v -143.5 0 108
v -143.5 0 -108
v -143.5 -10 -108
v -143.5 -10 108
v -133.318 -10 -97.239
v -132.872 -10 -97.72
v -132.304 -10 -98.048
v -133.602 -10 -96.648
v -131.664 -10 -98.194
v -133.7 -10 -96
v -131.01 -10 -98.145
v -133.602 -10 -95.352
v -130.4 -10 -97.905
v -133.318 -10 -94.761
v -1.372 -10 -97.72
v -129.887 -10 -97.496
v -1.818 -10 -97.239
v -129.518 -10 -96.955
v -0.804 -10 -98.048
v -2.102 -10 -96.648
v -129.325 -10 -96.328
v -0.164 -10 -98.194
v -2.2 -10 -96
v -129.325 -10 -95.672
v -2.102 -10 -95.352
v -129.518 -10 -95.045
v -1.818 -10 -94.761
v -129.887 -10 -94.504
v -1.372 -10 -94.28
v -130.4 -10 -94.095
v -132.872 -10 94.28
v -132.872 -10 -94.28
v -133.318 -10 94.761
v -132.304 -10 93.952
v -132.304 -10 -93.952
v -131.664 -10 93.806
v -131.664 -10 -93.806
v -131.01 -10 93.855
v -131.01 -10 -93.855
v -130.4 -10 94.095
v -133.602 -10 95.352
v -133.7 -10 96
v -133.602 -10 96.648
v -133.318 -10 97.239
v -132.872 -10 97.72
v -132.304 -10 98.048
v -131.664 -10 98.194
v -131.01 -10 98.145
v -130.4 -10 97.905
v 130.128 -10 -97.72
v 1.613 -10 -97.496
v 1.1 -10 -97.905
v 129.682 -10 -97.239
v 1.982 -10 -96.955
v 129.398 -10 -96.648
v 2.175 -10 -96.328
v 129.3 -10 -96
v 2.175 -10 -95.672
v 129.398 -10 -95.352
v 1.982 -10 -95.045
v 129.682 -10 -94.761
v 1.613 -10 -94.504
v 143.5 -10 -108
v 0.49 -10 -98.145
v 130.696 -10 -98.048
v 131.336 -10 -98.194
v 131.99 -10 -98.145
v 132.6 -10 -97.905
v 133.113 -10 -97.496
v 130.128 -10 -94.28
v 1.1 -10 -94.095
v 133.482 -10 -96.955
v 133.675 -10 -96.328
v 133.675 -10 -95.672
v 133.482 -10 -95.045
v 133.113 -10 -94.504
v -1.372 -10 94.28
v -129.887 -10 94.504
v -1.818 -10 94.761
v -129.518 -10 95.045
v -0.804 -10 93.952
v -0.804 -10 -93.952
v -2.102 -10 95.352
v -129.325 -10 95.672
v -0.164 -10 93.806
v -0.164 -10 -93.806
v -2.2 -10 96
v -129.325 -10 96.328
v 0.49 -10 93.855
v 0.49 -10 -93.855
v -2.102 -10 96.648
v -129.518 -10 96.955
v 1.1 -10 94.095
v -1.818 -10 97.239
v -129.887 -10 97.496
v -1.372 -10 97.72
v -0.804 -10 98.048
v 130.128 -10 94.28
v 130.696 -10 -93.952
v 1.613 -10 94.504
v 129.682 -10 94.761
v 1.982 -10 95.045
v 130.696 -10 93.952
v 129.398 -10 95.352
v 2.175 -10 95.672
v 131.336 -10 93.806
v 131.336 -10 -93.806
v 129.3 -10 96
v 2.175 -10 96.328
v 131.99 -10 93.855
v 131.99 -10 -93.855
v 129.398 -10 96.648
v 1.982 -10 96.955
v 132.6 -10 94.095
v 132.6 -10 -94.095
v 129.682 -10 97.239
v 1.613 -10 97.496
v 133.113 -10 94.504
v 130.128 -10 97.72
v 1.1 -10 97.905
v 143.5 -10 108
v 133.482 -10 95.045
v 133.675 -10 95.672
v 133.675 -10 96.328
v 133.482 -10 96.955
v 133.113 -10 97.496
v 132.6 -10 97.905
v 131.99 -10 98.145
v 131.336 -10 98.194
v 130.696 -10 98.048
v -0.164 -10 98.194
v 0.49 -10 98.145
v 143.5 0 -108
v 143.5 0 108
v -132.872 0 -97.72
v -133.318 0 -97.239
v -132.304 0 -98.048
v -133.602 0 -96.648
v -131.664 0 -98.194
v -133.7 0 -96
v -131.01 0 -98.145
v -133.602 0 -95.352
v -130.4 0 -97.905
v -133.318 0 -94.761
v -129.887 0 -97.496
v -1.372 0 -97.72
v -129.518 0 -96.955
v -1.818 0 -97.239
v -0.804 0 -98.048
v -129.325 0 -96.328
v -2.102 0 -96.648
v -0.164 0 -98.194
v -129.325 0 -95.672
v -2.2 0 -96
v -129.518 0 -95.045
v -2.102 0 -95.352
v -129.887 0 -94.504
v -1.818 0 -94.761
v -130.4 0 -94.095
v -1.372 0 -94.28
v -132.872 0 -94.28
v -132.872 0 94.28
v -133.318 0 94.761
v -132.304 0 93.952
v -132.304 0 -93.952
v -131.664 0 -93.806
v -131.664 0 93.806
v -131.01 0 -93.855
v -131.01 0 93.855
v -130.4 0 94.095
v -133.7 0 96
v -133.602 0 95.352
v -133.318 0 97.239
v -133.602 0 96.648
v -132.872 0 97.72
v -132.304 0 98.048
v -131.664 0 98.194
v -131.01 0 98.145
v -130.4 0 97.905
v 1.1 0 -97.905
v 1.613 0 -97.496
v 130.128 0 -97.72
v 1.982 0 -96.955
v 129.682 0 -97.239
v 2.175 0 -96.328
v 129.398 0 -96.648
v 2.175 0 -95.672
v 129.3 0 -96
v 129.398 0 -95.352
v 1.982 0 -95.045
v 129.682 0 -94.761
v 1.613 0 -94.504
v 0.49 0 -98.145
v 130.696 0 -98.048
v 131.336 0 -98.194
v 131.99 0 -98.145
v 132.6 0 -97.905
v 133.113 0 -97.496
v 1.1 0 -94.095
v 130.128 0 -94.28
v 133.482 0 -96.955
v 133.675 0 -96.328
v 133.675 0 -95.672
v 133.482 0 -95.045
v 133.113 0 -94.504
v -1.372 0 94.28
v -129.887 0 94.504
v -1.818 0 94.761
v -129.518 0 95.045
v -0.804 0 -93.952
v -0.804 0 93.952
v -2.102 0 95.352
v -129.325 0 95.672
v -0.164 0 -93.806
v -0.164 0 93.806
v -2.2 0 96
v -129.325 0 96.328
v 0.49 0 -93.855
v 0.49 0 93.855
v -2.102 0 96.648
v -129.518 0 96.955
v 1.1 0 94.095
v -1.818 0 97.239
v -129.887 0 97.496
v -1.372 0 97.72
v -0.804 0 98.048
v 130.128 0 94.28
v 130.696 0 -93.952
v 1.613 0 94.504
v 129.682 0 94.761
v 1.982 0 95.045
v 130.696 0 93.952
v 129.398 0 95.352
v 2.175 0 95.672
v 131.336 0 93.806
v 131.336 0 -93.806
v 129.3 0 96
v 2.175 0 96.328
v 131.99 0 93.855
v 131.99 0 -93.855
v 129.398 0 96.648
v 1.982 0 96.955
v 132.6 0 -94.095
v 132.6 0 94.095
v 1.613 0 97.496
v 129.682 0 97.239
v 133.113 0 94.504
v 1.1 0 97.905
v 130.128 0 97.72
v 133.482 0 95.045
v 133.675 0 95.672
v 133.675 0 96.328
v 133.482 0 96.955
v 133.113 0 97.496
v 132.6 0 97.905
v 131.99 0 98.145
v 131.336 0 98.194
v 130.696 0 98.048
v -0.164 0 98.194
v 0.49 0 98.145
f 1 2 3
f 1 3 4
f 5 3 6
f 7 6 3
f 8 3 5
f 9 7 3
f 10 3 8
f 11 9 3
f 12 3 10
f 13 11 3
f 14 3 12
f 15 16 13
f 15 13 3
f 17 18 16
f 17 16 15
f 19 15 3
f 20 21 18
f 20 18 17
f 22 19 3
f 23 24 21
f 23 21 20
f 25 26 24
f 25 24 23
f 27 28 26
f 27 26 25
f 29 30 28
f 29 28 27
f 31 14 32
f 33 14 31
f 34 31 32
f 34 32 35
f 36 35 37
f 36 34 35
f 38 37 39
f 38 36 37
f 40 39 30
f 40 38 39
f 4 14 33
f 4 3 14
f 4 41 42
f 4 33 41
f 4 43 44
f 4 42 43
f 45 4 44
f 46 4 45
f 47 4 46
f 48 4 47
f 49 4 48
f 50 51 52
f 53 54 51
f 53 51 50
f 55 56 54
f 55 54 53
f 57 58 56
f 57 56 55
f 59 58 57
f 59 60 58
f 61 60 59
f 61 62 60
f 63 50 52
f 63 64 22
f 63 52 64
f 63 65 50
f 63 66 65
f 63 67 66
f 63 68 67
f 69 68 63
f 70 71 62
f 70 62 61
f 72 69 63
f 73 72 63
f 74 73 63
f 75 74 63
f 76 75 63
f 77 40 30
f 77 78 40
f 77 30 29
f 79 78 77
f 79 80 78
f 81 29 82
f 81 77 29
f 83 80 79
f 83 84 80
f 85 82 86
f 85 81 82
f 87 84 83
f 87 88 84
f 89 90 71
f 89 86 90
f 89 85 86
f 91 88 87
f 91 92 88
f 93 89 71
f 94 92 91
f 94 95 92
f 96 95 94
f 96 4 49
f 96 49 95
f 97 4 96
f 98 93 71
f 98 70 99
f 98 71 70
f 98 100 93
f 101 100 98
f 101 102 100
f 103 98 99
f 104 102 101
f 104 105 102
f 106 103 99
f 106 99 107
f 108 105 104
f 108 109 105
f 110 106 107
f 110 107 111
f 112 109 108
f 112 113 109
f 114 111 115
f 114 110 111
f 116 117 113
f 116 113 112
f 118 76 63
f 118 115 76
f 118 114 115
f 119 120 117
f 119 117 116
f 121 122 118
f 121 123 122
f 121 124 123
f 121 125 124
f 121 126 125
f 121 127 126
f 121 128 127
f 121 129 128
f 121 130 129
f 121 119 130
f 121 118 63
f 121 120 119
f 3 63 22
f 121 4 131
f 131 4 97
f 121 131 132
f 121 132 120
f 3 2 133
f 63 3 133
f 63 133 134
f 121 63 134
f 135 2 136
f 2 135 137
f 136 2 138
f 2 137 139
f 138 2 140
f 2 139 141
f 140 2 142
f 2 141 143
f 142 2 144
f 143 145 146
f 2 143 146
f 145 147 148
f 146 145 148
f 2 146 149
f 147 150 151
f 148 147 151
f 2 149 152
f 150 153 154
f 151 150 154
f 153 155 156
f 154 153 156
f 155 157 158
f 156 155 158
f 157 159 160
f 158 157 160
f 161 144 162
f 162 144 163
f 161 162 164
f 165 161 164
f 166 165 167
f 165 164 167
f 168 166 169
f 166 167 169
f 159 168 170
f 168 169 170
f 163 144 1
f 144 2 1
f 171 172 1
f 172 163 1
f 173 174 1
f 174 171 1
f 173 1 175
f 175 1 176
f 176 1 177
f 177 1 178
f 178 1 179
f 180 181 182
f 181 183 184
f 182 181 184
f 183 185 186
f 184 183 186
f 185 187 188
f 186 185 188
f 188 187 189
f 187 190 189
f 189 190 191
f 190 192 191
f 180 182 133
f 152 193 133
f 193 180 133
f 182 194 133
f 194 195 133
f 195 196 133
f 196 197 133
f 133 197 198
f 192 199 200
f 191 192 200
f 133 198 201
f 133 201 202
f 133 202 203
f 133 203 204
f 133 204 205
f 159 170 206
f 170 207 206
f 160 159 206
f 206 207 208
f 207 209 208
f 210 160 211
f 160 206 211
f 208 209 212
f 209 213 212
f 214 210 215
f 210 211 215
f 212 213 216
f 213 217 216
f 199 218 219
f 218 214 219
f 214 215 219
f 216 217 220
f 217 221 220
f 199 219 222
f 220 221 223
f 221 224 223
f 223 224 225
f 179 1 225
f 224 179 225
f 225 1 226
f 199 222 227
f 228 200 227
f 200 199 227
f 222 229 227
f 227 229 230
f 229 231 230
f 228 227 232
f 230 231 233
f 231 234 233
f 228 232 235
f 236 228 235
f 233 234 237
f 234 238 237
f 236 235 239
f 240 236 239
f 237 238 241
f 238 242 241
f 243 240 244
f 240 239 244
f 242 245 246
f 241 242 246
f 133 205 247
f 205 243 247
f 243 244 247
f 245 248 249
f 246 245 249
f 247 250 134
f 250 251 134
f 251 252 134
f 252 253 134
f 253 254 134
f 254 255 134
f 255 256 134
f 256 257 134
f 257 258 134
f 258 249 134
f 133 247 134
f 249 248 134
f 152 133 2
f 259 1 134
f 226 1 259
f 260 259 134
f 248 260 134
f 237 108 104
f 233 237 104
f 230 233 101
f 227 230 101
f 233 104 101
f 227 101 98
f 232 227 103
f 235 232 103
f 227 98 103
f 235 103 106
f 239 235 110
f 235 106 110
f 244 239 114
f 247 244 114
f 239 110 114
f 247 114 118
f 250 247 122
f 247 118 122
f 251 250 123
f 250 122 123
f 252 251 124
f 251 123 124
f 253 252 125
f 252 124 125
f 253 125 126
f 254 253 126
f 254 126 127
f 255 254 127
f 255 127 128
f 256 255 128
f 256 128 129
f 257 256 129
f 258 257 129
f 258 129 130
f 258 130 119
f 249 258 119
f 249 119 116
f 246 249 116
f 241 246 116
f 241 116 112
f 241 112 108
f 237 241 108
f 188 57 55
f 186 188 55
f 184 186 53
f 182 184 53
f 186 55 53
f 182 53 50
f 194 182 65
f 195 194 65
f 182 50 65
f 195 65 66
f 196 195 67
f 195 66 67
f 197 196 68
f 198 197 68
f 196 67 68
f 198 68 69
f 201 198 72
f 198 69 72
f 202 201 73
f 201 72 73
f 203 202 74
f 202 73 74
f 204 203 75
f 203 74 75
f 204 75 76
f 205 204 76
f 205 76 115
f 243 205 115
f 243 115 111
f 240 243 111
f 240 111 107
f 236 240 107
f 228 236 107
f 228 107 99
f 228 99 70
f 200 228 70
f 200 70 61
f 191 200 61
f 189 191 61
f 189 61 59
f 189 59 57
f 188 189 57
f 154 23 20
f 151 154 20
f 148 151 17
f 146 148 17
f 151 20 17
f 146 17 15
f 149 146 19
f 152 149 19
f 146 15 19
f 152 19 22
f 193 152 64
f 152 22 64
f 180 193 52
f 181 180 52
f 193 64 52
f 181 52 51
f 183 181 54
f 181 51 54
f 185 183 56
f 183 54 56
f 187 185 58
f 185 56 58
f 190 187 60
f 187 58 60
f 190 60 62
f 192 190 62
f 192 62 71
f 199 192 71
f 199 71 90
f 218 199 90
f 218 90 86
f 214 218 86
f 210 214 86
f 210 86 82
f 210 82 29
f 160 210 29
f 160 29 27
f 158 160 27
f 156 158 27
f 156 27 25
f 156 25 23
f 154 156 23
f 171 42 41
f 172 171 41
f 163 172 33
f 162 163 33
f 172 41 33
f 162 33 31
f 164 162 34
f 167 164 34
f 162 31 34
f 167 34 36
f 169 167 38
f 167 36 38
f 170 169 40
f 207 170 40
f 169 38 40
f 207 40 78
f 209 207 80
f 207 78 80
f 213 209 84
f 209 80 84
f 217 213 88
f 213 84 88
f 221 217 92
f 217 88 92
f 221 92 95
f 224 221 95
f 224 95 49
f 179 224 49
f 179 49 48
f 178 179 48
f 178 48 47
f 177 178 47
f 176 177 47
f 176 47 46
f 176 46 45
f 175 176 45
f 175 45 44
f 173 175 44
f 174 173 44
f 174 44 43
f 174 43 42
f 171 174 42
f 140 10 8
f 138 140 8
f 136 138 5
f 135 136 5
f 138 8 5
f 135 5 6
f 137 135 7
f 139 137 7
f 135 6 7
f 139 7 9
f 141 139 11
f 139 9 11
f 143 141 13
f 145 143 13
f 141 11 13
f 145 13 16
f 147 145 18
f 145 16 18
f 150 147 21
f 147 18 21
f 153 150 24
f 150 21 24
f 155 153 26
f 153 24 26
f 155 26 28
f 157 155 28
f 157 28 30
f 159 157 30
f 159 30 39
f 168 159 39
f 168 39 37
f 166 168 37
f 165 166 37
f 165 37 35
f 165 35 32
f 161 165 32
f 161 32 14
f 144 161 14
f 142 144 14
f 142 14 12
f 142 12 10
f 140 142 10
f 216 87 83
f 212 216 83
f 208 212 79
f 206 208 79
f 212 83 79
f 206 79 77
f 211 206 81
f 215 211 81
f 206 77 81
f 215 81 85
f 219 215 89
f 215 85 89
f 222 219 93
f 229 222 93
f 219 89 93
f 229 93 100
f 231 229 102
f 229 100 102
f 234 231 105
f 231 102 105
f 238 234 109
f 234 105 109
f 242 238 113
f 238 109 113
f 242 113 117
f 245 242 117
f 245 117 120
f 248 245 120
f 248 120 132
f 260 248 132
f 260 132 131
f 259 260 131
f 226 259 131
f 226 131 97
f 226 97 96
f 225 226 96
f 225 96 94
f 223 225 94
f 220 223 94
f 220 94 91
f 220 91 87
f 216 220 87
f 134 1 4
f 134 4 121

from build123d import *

# Parameters (mm, degrees)
F0_W     = 287
F0_H     = 216
F1_DEPTH = 10
F2_D     = 4.4


with BuildPart() as f1:
    # F0 (on Front) → F1 (new body)
    with BuildSketch(Plane.XZ):
        Rectangle(F0_W, F0_H)
    extrude(amount=F1_DEPTH)

    # F2 (through all)
    with Locations(Plane(origin=(0, 0, 0), x_dir=(1, 0, 0), z_dir=(0, 1, 0))):
        with Locations((0, -96), (-131.5, -96), (131.5, -96), (131.5, 96), (-131.5, 96), (0, 96)):
            Hole(F2_D / 2)


solid = f1.part
